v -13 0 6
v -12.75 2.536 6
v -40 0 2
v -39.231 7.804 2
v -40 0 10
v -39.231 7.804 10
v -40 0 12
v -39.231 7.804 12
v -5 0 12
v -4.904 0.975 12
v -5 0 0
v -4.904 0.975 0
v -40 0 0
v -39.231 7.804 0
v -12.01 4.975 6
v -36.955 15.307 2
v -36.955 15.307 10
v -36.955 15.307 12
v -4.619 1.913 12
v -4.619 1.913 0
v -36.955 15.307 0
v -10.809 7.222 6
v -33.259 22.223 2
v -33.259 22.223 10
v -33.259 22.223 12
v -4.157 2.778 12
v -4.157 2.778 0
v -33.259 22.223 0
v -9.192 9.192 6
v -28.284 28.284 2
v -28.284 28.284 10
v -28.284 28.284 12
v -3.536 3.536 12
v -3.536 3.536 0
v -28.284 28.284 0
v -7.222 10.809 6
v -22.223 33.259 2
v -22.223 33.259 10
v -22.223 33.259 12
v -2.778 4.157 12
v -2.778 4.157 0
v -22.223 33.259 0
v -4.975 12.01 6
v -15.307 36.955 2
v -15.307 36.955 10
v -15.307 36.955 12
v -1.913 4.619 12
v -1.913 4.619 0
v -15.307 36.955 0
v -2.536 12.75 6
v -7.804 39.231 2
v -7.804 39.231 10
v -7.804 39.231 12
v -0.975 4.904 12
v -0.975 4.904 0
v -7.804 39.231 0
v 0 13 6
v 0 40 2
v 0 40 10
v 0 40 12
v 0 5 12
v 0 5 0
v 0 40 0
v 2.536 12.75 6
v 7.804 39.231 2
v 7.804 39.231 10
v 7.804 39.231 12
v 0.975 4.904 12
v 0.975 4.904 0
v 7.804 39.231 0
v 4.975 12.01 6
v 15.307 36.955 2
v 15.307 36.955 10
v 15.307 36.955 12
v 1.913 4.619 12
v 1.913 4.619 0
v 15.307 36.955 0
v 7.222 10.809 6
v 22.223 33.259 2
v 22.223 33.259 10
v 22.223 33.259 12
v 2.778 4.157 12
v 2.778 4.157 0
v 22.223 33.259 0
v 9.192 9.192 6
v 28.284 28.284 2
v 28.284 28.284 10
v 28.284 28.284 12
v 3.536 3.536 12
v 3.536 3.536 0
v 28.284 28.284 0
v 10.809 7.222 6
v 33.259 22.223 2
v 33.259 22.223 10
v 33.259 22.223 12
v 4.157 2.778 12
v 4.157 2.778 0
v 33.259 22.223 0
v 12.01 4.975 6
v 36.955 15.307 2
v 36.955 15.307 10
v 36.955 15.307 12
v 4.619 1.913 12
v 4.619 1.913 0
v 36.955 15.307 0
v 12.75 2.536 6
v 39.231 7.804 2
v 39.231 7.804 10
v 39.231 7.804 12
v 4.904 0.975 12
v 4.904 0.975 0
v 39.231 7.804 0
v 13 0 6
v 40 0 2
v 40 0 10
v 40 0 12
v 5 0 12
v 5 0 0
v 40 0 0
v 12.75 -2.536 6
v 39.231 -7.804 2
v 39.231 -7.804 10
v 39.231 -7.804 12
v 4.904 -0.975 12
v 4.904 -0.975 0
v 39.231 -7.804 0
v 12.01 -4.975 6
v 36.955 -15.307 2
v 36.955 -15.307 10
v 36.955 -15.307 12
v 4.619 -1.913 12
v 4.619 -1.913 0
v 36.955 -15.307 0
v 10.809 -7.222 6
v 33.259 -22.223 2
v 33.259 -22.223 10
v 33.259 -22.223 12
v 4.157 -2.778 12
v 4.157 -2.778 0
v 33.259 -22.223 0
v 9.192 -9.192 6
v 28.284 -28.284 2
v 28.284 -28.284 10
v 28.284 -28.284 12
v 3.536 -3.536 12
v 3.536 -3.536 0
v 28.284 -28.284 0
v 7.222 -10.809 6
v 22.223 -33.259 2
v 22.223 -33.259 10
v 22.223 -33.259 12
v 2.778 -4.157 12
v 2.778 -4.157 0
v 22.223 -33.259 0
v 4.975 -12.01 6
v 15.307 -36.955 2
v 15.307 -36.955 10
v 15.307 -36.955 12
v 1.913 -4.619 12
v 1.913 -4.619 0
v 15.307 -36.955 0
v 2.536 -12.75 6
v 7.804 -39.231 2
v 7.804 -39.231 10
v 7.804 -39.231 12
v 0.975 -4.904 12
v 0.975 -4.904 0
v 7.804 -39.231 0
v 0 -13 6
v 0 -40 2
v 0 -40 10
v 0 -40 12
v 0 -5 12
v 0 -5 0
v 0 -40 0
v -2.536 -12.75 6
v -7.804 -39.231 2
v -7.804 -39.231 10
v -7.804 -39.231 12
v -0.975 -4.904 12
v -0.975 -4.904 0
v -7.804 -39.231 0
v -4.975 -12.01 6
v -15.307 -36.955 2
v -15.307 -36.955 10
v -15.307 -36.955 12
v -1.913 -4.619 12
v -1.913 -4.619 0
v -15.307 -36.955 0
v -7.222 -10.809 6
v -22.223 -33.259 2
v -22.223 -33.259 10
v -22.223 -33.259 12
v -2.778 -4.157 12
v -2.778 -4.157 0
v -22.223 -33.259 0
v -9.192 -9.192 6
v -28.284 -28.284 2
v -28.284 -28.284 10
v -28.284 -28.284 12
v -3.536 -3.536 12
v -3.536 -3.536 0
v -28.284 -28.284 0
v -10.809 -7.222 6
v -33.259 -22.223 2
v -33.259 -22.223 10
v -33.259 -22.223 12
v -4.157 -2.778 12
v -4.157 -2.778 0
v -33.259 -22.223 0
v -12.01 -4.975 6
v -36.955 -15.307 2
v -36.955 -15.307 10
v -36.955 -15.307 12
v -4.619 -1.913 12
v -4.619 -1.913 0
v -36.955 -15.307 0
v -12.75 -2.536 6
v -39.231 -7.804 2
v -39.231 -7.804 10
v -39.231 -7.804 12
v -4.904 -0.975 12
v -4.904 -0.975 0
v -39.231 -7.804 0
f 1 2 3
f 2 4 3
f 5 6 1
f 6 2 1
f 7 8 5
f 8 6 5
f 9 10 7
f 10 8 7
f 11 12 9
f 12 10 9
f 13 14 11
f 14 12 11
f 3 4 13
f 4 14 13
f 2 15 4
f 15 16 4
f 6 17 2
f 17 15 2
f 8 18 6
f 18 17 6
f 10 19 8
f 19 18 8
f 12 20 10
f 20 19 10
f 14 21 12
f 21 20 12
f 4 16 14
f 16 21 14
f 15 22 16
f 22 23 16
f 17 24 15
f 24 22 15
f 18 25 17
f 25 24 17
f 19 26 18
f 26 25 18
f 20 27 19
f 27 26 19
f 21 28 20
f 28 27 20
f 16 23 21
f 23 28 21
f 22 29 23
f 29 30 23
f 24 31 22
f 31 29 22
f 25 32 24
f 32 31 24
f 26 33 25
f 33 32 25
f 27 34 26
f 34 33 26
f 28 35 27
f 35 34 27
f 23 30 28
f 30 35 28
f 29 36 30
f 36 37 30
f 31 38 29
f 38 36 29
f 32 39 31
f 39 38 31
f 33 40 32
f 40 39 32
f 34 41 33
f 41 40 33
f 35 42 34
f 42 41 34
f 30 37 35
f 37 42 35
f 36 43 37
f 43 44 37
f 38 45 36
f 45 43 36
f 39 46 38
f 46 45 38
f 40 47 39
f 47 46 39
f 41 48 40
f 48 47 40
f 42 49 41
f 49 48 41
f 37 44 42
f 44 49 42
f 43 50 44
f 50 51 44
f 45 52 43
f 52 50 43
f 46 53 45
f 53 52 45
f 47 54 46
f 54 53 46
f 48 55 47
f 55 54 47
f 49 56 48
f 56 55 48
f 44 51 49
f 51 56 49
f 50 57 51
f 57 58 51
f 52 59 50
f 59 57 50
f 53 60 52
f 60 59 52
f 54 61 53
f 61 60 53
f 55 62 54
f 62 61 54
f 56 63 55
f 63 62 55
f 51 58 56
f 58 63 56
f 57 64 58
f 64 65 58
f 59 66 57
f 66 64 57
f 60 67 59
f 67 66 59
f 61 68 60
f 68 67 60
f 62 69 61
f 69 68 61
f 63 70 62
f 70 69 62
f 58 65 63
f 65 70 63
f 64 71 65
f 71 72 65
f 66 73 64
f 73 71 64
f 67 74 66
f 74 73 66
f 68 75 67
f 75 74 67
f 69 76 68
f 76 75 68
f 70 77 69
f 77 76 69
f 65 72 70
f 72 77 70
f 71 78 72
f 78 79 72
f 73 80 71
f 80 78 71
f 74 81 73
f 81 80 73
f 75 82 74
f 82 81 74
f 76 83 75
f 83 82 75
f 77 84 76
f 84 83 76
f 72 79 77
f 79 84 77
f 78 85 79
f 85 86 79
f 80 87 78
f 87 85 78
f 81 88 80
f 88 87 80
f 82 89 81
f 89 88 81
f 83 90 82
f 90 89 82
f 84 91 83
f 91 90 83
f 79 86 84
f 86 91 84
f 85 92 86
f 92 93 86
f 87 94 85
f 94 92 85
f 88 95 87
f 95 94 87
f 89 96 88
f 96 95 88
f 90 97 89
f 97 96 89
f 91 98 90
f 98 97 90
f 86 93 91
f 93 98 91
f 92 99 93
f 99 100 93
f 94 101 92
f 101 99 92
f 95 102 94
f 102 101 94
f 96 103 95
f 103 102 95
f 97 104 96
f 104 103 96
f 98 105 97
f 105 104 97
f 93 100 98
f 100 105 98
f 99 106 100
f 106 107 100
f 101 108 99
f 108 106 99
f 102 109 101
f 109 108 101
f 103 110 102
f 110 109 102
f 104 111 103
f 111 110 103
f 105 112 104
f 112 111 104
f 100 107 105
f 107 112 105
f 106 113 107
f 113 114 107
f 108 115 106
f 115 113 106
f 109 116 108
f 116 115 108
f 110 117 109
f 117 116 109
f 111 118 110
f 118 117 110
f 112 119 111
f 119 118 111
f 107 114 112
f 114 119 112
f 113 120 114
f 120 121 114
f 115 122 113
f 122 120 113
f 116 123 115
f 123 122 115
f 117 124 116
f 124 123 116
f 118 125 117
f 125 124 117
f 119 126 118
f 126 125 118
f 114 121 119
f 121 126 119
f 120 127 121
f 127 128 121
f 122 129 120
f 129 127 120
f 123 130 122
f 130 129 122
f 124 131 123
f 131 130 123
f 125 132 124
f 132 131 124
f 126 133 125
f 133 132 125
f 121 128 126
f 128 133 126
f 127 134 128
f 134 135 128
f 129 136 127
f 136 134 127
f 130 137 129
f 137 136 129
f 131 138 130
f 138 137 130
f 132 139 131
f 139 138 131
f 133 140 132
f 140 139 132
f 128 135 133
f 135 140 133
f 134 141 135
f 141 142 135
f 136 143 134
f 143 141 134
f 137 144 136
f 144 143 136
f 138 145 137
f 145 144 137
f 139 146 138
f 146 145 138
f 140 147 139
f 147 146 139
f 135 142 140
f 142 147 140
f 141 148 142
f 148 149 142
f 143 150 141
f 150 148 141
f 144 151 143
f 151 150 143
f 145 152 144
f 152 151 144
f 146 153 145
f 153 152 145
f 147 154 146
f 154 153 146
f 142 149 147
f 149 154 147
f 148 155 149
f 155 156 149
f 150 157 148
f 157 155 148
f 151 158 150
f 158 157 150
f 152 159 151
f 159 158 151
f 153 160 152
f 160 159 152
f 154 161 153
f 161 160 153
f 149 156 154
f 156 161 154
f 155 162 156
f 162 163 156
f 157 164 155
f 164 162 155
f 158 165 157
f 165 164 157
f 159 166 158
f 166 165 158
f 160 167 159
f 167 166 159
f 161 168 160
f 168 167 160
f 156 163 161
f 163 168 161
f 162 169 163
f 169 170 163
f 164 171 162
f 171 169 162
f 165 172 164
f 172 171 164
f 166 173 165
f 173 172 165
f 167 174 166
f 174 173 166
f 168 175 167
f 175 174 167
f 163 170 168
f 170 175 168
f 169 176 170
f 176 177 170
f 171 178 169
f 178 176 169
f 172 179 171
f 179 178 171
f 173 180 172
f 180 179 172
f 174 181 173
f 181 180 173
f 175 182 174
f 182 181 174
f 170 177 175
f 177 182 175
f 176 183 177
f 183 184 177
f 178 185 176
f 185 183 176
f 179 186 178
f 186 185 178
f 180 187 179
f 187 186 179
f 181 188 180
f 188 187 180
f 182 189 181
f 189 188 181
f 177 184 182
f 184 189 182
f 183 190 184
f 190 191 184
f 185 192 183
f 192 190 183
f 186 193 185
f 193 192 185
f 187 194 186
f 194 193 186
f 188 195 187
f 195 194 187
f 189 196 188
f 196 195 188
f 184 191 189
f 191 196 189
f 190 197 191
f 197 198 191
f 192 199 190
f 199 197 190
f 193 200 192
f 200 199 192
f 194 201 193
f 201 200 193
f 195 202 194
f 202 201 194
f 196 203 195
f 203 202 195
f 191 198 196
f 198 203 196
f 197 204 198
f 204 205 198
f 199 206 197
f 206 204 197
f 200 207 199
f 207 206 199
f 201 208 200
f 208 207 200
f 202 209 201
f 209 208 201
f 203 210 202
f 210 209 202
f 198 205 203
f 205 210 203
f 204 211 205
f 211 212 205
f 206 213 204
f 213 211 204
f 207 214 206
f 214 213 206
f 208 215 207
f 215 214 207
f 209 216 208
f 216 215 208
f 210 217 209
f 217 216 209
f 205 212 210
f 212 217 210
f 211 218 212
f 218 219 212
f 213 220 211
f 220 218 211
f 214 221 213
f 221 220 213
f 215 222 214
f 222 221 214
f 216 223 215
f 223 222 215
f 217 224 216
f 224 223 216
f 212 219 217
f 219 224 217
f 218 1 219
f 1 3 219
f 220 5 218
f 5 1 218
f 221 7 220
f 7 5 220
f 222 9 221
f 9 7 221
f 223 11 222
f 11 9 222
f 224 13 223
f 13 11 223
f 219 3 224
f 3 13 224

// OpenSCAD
$fn = 32;

// ----------------------------------------------------------------------
// Revolved part: V-groove pulley R40
// ----------------------------------------------------------------------

// --- parameters (mm) ---
bore_r = 5;               // bore radius
rim_r = 40;               // rim radius
rim_t = 12;               // rim width
groove_r = 13;            // groove root radius
groove_w = 4;             // groove half width
revolve_angle = 360;      // revolve sweep, degrees

bore_d = 2 * bore_r;
rim_d = 2 * rim_r;
groove_d = 2 * groove_r;

profile = [[5, 0], [40, 0], [40, 2], [13, 6], [40, 10], [40, 12], [5, 12]];  // primary outline, 7 points, counter clockwise

// --- the one profile operation ---
rotate_extrude(angle = revolve_angle) polygon(points = profile);
